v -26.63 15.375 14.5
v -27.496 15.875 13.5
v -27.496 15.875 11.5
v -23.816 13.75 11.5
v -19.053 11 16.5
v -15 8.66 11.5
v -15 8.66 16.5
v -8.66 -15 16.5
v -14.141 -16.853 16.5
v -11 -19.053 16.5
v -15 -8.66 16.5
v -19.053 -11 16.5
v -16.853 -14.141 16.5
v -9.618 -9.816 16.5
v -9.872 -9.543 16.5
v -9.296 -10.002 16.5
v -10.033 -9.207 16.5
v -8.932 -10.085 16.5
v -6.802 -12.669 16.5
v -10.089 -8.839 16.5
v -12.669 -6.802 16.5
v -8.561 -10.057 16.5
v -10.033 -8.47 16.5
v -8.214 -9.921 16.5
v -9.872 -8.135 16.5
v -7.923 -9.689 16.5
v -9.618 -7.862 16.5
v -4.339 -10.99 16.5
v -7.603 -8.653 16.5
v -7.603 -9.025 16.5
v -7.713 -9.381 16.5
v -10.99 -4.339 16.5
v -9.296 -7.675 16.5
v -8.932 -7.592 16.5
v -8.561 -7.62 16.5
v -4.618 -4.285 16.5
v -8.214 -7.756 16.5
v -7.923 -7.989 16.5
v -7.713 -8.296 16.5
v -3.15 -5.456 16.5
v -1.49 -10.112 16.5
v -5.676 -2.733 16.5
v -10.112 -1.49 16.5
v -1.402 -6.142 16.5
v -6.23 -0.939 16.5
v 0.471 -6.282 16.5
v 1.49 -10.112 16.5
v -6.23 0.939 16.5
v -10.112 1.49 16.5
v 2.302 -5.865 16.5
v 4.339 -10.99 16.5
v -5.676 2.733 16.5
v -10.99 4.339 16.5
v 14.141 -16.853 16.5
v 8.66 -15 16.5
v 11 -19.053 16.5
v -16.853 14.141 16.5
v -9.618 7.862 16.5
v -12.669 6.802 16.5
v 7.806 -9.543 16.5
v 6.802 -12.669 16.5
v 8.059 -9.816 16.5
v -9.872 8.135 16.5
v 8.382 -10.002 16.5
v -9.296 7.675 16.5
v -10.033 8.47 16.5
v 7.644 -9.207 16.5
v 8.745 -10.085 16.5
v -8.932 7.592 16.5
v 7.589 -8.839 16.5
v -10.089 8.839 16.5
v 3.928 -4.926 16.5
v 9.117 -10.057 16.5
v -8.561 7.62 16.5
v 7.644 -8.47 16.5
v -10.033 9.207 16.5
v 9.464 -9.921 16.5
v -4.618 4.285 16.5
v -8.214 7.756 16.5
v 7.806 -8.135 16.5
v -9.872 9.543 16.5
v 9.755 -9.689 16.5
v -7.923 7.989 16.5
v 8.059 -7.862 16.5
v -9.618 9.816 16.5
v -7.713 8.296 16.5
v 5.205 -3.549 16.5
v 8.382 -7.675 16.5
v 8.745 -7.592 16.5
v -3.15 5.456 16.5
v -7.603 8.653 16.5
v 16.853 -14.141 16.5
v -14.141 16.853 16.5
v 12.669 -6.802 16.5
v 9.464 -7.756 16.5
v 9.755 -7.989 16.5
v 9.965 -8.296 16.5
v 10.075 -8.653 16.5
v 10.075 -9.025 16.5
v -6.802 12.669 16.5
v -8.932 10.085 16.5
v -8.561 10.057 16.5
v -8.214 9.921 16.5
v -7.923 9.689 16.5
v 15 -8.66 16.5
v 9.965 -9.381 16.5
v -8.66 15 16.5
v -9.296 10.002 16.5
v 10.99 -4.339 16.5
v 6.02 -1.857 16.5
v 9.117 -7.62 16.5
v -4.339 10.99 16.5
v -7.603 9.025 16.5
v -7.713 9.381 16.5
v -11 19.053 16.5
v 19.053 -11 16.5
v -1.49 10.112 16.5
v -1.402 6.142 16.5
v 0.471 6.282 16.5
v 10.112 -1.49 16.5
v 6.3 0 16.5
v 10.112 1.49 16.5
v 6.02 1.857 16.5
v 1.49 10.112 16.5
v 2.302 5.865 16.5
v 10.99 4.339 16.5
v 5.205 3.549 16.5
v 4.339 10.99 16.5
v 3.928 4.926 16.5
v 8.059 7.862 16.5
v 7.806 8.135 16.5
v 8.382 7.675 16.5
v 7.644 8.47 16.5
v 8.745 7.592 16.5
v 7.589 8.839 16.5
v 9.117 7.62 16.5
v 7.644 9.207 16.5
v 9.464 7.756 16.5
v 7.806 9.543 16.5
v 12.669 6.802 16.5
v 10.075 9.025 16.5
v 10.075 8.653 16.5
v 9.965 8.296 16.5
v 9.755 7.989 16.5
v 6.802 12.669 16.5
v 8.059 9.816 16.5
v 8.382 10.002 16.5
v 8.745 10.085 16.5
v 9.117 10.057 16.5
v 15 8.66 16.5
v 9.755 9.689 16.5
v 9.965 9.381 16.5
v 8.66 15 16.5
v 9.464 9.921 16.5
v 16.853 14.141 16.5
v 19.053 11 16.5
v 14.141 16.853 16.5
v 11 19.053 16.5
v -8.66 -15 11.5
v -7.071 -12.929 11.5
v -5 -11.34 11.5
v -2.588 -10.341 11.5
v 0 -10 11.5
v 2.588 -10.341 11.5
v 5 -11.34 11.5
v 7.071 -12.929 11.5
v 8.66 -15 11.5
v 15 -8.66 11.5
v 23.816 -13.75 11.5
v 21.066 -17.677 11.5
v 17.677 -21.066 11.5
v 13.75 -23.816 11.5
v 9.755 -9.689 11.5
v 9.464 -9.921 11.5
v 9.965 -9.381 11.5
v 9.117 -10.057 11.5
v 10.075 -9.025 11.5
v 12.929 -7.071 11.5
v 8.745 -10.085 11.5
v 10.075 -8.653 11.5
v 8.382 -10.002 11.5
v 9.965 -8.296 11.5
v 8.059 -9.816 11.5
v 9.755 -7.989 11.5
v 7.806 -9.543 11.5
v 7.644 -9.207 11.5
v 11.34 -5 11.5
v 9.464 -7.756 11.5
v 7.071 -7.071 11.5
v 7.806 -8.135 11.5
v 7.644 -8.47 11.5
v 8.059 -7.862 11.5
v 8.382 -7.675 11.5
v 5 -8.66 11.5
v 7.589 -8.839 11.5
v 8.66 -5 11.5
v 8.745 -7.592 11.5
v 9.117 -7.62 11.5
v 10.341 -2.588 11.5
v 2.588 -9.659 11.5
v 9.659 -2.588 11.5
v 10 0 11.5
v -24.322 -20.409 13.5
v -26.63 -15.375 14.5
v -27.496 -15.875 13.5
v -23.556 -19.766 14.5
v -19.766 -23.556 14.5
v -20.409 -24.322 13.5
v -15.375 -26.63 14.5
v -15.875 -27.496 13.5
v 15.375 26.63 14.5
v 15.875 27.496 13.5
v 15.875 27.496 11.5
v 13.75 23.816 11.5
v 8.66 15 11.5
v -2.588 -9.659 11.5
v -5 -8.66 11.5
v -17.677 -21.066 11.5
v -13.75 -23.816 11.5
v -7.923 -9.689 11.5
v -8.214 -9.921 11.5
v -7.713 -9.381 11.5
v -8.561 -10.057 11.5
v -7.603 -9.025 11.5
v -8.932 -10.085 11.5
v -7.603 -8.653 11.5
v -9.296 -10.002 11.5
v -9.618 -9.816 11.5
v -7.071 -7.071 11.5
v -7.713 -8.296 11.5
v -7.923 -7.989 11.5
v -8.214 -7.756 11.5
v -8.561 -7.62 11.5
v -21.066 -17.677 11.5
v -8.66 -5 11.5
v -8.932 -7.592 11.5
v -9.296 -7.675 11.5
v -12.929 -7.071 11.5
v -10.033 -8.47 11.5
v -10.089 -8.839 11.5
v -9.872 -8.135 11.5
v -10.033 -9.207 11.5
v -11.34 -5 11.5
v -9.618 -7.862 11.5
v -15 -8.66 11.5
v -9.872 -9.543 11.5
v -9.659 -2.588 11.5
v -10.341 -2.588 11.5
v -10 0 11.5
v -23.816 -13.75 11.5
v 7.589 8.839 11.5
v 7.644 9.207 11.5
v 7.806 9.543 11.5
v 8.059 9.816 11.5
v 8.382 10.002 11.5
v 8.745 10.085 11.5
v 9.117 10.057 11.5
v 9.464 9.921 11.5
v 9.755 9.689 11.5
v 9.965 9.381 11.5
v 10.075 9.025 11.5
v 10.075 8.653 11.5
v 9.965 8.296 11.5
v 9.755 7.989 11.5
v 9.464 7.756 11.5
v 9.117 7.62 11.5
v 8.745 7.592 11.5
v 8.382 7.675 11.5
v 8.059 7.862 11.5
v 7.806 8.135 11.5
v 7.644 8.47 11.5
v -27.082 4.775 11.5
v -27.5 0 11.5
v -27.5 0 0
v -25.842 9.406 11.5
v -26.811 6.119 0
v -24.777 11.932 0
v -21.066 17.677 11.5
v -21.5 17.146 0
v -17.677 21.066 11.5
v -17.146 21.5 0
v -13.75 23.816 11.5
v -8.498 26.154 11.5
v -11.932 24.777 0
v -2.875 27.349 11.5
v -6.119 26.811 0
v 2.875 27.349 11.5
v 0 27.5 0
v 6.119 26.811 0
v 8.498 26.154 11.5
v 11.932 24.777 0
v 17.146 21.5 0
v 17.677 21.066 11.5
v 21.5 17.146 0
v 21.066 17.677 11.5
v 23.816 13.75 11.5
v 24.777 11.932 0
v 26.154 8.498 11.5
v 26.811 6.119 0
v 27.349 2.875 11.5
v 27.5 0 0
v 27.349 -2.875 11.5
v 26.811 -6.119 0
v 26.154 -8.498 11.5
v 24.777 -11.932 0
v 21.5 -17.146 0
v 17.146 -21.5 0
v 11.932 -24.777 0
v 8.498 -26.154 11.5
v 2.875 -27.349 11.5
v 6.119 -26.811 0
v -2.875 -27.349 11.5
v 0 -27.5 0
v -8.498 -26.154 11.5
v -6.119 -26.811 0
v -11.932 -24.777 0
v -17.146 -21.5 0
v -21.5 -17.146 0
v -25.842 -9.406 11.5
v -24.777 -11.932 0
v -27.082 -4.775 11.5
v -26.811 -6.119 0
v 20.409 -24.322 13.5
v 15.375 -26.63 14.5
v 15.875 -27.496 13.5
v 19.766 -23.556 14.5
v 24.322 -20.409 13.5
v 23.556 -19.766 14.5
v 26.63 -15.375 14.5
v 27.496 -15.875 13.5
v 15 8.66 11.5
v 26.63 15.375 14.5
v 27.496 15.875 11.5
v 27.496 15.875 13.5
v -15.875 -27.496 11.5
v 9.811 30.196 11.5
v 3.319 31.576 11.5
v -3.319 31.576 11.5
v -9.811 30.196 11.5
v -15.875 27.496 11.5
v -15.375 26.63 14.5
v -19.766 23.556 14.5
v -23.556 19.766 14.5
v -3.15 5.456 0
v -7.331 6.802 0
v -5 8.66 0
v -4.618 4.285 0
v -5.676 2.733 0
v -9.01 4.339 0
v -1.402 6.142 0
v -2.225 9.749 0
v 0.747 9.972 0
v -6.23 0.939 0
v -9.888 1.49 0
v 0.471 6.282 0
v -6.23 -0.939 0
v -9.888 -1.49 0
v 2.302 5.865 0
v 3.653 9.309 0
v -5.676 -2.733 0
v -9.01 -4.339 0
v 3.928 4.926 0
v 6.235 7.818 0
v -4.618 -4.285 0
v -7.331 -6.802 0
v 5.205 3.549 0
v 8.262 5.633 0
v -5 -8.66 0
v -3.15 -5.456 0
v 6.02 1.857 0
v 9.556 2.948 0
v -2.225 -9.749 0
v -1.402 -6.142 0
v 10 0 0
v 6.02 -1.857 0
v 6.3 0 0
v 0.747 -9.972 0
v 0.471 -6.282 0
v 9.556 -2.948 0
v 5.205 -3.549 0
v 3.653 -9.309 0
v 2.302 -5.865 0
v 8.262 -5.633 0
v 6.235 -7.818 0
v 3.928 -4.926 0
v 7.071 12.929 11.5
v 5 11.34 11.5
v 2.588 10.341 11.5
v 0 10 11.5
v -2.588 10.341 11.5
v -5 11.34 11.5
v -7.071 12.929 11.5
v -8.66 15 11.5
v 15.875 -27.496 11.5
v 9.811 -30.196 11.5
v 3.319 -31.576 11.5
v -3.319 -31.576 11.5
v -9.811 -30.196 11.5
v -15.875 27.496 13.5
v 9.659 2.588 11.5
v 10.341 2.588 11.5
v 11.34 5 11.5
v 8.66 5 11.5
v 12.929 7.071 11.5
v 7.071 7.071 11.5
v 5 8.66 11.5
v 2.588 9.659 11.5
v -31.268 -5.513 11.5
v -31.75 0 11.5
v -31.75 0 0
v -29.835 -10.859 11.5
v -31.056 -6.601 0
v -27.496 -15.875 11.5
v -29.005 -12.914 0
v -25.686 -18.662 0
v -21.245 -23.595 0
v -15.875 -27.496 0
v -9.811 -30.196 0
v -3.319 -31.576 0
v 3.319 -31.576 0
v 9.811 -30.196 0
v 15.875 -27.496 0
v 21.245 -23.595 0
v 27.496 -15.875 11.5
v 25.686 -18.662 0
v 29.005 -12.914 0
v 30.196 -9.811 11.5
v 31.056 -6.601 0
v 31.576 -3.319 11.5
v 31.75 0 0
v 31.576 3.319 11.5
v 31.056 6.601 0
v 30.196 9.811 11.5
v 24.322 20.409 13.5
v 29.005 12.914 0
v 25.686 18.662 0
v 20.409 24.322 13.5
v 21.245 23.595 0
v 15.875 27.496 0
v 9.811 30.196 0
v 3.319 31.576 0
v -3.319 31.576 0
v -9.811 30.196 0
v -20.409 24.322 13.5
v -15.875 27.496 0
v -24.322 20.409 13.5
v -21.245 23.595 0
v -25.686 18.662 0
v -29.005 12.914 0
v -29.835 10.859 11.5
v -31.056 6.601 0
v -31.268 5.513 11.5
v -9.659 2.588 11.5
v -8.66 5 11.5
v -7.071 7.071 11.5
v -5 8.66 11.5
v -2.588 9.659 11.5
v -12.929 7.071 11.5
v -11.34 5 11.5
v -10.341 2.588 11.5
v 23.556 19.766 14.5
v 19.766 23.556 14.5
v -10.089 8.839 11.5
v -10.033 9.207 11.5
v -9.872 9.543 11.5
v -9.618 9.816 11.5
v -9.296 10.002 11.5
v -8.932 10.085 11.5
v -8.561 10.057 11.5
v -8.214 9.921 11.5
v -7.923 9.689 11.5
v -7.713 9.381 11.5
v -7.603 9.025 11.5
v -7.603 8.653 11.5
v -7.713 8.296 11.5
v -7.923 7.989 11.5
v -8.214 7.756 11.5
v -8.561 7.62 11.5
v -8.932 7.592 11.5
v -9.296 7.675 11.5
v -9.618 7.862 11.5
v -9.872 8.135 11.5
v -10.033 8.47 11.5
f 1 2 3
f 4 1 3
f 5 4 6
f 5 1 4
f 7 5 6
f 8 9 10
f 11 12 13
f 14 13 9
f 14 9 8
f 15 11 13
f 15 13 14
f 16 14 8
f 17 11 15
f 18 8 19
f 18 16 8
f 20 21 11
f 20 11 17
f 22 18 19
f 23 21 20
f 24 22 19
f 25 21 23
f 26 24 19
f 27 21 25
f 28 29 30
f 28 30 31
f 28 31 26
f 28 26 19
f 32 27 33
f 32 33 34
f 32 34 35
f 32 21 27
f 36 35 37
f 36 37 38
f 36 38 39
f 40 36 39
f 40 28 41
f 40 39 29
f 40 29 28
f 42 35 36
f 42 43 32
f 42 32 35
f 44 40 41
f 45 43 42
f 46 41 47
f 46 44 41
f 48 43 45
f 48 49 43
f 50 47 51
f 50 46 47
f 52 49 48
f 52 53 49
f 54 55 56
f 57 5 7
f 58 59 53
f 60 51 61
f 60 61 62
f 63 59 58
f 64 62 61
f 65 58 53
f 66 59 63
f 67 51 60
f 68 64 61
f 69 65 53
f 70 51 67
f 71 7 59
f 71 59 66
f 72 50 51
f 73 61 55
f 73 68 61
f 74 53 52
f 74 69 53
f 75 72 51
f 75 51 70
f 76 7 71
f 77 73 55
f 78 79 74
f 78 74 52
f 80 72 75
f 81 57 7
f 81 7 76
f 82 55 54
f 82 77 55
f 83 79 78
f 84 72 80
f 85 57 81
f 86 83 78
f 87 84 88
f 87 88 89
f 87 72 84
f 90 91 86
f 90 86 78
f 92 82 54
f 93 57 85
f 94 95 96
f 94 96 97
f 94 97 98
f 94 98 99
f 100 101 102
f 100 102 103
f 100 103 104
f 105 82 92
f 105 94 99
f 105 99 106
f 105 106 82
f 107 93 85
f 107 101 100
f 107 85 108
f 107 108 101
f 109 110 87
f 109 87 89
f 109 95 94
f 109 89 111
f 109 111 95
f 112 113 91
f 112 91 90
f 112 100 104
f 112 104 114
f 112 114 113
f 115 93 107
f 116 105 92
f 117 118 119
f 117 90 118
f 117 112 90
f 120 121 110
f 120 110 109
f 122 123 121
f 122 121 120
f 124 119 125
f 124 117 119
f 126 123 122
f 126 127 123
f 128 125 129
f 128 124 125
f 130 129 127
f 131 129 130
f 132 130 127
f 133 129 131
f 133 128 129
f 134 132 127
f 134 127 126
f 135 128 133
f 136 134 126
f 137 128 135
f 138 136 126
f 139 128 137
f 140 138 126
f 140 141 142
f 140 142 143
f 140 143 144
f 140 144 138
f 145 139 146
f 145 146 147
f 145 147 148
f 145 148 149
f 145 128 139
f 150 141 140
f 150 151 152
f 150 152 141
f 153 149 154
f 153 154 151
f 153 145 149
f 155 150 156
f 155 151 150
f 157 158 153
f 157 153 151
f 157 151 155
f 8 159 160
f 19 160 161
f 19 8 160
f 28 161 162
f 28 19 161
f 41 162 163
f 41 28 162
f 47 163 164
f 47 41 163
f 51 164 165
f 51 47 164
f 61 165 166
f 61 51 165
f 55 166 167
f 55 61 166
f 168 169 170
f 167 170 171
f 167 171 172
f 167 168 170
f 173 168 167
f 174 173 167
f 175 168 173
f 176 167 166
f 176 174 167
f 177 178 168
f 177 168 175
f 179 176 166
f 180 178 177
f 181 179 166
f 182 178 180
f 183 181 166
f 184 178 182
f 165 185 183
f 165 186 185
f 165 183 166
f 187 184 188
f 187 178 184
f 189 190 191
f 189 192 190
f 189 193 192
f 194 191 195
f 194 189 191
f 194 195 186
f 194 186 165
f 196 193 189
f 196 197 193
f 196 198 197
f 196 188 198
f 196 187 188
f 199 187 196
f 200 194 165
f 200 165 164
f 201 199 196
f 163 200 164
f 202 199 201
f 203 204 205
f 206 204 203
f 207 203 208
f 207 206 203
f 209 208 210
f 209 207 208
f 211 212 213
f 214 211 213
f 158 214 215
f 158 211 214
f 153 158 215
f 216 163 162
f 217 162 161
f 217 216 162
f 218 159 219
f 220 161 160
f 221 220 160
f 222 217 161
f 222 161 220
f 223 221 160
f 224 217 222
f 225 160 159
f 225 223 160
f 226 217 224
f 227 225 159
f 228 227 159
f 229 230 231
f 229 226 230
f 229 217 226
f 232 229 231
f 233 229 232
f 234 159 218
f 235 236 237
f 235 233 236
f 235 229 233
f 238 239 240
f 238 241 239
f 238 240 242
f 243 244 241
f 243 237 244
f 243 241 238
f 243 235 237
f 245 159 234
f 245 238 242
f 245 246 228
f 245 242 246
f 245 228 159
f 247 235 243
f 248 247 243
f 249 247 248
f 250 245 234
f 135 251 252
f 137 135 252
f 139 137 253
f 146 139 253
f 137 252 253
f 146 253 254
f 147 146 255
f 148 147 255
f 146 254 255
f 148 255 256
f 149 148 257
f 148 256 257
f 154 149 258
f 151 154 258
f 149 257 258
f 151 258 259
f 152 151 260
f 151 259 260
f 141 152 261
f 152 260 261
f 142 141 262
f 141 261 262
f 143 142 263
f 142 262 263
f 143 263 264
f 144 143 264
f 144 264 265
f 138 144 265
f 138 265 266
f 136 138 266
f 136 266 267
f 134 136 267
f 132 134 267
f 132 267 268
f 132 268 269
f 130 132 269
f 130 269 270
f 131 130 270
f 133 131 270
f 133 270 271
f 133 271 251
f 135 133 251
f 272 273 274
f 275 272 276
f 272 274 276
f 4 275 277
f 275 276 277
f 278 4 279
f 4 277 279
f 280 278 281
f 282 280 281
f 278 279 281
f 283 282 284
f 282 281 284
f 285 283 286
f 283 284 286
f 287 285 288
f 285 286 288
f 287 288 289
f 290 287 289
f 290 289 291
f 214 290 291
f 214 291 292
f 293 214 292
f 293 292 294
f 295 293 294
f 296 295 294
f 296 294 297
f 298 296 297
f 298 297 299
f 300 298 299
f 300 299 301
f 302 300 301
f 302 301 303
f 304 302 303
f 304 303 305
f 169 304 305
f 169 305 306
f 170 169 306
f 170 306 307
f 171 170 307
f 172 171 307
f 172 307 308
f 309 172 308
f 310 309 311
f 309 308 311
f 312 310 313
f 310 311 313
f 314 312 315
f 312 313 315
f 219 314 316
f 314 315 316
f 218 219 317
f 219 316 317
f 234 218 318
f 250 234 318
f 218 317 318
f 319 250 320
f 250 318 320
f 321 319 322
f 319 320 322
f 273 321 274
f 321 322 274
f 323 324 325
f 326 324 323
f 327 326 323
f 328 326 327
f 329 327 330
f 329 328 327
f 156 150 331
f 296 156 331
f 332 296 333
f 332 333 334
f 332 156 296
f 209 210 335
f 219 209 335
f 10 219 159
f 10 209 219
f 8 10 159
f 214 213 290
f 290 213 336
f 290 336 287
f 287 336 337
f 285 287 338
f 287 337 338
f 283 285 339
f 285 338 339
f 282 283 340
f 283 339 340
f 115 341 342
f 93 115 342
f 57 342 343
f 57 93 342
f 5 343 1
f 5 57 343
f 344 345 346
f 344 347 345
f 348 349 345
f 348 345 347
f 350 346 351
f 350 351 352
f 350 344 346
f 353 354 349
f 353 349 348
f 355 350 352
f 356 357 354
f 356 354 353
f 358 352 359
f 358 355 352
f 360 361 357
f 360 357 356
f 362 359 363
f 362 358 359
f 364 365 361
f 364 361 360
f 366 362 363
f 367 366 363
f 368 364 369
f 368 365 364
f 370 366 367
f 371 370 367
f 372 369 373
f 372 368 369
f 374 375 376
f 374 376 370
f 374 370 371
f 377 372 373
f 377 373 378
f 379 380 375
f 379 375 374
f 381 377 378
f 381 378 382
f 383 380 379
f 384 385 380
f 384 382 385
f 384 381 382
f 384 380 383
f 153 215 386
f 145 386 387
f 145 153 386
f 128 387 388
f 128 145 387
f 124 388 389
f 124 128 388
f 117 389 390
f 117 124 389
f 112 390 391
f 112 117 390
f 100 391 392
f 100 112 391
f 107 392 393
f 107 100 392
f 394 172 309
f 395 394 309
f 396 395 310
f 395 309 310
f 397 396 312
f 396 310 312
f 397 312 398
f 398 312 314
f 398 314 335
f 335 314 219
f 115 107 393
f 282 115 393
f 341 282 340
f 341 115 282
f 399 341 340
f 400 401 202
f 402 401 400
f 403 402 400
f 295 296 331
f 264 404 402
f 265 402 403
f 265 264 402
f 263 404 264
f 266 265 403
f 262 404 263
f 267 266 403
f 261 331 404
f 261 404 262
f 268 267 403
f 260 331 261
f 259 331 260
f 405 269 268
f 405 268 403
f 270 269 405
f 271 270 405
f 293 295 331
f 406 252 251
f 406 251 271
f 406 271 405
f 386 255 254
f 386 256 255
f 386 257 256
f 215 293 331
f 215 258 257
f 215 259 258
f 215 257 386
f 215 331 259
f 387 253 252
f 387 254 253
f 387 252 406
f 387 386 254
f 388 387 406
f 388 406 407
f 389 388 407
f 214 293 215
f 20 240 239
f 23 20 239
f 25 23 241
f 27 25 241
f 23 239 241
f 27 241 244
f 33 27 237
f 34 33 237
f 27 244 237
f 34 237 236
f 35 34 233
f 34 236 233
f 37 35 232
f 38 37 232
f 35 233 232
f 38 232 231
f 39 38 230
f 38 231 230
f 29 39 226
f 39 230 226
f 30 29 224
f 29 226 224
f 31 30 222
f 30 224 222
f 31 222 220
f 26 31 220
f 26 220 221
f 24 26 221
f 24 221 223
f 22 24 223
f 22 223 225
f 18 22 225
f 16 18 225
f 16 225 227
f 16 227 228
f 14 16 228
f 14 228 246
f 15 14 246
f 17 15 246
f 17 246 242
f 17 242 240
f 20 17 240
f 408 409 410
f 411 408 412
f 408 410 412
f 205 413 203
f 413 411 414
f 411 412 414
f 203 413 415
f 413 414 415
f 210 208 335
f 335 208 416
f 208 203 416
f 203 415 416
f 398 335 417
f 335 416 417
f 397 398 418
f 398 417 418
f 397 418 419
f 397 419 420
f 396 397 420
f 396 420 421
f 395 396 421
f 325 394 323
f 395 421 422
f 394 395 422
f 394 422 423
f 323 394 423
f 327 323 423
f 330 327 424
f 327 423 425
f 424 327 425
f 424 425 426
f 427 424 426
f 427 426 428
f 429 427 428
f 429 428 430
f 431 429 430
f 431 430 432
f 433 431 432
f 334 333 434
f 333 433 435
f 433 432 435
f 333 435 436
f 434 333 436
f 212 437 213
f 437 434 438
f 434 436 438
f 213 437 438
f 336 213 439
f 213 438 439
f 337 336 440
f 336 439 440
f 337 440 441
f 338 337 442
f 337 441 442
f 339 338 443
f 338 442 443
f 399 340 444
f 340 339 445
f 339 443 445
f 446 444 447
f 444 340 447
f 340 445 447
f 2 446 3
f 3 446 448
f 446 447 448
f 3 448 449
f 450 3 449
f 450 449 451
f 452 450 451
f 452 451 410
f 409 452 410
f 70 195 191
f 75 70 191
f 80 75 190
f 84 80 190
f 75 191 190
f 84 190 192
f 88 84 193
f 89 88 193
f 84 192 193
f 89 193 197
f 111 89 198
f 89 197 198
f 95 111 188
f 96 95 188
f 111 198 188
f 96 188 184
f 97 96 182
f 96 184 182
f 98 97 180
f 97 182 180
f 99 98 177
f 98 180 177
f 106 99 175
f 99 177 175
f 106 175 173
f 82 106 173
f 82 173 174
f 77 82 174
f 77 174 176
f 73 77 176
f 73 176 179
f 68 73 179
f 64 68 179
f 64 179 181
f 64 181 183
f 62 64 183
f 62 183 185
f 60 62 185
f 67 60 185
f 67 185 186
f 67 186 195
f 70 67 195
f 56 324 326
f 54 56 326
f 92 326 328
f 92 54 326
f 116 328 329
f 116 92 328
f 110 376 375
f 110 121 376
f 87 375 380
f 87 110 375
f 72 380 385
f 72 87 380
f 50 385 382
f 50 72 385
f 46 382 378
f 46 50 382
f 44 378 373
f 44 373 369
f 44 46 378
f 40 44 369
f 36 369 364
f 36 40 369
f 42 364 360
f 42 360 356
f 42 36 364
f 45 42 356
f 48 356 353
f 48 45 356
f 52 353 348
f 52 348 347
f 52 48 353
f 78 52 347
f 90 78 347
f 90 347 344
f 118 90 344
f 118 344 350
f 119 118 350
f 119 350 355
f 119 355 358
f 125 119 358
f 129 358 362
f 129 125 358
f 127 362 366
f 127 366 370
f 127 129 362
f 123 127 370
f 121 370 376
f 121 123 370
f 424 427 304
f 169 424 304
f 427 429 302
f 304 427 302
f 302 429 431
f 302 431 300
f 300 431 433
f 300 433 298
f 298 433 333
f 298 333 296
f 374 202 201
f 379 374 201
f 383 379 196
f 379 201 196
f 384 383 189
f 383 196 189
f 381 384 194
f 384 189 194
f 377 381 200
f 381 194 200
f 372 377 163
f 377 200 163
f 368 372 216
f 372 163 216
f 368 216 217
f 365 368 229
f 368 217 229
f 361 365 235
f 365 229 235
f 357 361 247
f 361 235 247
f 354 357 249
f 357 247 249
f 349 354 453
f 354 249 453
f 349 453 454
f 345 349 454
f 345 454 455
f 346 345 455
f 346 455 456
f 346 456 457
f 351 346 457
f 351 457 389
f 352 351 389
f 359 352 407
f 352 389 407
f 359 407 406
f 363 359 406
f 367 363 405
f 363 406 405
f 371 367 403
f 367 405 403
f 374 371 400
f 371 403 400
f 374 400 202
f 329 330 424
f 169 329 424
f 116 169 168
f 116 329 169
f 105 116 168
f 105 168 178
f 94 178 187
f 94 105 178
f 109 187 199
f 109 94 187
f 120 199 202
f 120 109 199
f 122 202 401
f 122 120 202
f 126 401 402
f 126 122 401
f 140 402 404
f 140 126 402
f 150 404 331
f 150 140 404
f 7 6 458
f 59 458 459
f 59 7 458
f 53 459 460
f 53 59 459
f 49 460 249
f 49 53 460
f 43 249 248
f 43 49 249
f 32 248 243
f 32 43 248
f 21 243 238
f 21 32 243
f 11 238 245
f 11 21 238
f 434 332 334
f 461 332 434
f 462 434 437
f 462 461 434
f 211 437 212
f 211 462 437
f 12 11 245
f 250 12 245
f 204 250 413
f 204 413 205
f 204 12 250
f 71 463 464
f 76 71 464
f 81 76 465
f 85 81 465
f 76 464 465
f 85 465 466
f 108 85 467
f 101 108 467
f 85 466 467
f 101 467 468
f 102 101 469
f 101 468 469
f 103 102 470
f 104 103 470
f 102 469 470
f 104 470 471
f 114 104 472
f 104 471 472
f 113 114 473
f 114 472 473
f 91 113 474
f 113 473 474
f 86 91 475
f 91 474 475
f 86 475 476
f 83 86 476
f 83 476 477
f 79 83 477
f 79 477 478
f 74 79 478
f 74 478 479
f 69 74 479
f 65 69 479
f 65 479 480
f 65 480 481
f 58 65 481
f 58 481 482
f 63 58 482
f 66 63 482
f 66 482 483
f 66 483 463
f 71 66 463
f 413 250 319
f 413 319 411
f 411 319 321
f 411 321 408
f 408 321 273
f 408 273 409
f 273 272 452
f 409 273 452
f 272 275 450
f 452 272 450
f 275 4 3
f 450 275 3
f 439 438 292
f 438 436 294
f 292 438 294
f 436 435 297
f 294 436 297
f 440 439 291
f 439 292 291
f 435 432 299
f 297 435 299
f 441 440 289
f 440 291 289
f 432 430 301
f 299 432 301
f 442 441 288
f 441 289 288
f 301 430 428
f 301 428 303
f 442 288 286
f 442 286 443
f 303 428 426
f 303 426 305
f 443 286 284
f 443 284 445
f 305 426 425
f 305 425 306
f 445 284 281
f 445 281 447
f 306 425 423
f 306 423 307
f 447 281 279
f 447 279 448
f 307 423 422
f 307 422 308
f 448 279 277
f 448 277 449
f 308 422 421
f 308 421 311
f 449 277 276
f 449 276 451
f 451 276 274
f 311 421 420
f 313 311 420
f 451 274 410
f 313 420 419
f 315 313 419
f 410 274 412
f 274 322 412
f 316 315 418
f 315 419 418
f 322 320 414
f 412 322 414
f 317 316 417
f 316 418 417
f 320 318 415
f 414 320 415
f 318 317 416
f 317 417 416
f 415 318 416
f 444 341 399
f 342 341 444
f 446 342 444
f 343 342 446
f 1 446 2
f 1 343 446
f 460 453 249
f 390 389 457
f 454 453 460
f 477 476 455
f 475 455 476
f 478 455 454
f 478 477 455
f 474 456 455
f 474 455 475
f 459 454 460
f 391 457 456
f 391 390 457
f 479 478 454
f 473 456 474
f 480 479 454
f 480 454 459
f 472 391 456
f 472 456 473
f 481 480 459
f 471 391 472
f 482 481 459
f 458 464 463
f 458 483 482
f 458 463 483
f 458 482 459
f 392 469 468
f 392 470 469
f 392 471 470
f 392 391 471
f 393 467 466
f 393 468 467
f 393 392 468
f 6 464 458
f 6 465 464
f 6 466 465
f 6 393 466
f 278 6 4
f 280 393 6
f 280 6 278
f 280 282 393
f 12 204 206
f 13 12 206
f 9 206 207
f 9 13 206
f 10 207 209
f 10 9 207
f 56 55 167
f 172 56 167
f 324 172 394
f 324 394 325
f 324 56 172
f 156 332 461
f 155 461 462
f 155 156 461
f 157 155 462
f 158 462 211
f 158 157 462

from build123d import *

# Parameters (mm, degrees)
SKETCH_1_R          = 31.75
EXTRUDE_1_DEPTH     = 14.5
CHAMFER_1_SIZE      = 1
SKETCH_3_R          = 30.75
SKETCH_2_R          = 22
SKETCH_4_R          = 6.3
CUT_EXTRUDE_1_DEPTH = 48.836962696
CUT_EXTRUDE_2_DEPTH = 5
SKETCH_6_R          = 27.5
CUT_EXTRUDE_3_DEPTH = 11.5
M3X0_51_D           = 2.5
SKETCH_11_R         = 10
SKETCH_11_R_2       = 6.3
EXTRUDE_2_DEPTH     = 11.5


with BuildPart() as part:
    # Эскиз1 → Бобышка-Вытянуть1 (new body)
    with BuildSketch(Plane.XY):
        with Locations(Location((0, 0, 0), (0, 0, 180))):
            Circle(SKETCH_1_R)
    extrude(amount=EXTRUDE_1_DEPTH)

    # Фаска1
    chamfer_1_edges = [part.edges().sort_by_distance(p)[0] for p in [
        (31.75, 0, 14.5),
    ]]
    chamfer(chamfer_1_edges, length=CHAMFER_1_SIZE)

    # Эскиз3 → По сечениям3 section 0
    with BuildSketch(Plane.XY.offset(14.5)):
        Circle(SKETCH_3_R)
    # Эскиз2 → По сечениям3 section 1
    with BuildSketch(Plane.XY.offset(16.5)):
        Circle(SKETCH_2_R)
    loft()

    # Эскиз4 → Вырез-Вытянуть1 (cut, through all)
    with BuildSketch(Plane.XY.offset(16.5)):
        Circle(SKETCH_4_R)
    extrude(amount=-CUT_EXTRUDE_1_DEPTH, mode=Mode.SUBTRACT)

    # Эскиз5 → Вырез-Вытянуть2 (cut)
    with BuildSketch(Plane.XY.offset(16.5)):
        with BuildLine():
            Line((-8.660254038, 15), (-15.875, 27.49630657))
            ThreePointArc((-15.875, 27.49630657), (0, 31.75), (15.875, 27.49630657))
            Line((15.875, 27.49630657), (8.660254038, 15))
            ThreePointArc((8.660254038, 15), (0, 10), (-8.660254038, 15))
        make_face()
        with BuildLine():
            Line((15, 8.660254038), (27.49630657, 15.875))
            ThreePointArc((27.49630657, 15.875), (31.75, 0), (27.49630657, -15.875))
            Line((27.49630657, -15.875), (15, -8.660254038))
            ThreePointArc((15, -8.660254038), (10, 0), (15, 8.660254038))
        make_face()
        with BuildLine():
            Line((8.660254038, -15), (15.875, -27.49630657))
            ThreePointArc((15.875, -27.49630657), (0, -31.75), (-15.875, -27.49630657))
            Line((-15.875, -27.49630657), (-8.660254038, -15))
            ThreePointArc((-8.660254038, -15), (0, -10), (8.660254038, -15))
        make_face()
        with BuildLine():
            Line((-15, -8.660254038), (-27.49630657, -15.875))
            ThreePointArc((-27.49630657, -15.875), (-31.75, 0), (-27.49630657, 15.875))
            Line((-27.49630657, 15.875), (-15, 8.660254038))
            ThreePointArc((-15, 8.660254038), (-10, 0), (-15, -8.660254038))
        make_face()
    extrude(amount=-CUT_EXTRUDE_2_DEPTH, mode=Mode.SUBTRACT)

    # Эскиз6 → Вырез-Вытянуть3 (cut)
    with BuildSketch(Plane(origin=(0, 0, 0), x_dir=(-1, 0, 0), z_dir=(0, 0, -1))):
        Circle(SKETCH_6_R)
    extrude(amount=-CUT_EXTRUDE_3_DEPTH, mode=Mode.SUBTRACT)

    # Отверстие обработанное метчиком M3x0.51 (through all)
    with Locations(Plane.XY.offset(16.5)):
        with Locations((-8.838834765, 8.838834765), (-8.838834765, -8.838834765), (8.838834765, -8.838834765), (8.838834765, 8.838834765)):
            Hole(M3X0_51_D / 2)

    # Эскиз11 → Бобышка-Вытянуть2 (add)
    with BuildSketch(Plane(origin=(0, 0, 11.5), x_dir=(-1, 0, 0), z_dir=(0, 0, -1))):
        with Locations(Location((0, 0, 0), (0, 0, 180))):
            Circle(SKETCH_11_R)
        with Locations(Location((0, 0, 0), (0, 0, 180))):
            Circle(SKETCH_11_R_2, mode=Mode.SUBTRACT)
    extrude(amount=EXTRUDE_2_DEPTH)


solid = part.part
